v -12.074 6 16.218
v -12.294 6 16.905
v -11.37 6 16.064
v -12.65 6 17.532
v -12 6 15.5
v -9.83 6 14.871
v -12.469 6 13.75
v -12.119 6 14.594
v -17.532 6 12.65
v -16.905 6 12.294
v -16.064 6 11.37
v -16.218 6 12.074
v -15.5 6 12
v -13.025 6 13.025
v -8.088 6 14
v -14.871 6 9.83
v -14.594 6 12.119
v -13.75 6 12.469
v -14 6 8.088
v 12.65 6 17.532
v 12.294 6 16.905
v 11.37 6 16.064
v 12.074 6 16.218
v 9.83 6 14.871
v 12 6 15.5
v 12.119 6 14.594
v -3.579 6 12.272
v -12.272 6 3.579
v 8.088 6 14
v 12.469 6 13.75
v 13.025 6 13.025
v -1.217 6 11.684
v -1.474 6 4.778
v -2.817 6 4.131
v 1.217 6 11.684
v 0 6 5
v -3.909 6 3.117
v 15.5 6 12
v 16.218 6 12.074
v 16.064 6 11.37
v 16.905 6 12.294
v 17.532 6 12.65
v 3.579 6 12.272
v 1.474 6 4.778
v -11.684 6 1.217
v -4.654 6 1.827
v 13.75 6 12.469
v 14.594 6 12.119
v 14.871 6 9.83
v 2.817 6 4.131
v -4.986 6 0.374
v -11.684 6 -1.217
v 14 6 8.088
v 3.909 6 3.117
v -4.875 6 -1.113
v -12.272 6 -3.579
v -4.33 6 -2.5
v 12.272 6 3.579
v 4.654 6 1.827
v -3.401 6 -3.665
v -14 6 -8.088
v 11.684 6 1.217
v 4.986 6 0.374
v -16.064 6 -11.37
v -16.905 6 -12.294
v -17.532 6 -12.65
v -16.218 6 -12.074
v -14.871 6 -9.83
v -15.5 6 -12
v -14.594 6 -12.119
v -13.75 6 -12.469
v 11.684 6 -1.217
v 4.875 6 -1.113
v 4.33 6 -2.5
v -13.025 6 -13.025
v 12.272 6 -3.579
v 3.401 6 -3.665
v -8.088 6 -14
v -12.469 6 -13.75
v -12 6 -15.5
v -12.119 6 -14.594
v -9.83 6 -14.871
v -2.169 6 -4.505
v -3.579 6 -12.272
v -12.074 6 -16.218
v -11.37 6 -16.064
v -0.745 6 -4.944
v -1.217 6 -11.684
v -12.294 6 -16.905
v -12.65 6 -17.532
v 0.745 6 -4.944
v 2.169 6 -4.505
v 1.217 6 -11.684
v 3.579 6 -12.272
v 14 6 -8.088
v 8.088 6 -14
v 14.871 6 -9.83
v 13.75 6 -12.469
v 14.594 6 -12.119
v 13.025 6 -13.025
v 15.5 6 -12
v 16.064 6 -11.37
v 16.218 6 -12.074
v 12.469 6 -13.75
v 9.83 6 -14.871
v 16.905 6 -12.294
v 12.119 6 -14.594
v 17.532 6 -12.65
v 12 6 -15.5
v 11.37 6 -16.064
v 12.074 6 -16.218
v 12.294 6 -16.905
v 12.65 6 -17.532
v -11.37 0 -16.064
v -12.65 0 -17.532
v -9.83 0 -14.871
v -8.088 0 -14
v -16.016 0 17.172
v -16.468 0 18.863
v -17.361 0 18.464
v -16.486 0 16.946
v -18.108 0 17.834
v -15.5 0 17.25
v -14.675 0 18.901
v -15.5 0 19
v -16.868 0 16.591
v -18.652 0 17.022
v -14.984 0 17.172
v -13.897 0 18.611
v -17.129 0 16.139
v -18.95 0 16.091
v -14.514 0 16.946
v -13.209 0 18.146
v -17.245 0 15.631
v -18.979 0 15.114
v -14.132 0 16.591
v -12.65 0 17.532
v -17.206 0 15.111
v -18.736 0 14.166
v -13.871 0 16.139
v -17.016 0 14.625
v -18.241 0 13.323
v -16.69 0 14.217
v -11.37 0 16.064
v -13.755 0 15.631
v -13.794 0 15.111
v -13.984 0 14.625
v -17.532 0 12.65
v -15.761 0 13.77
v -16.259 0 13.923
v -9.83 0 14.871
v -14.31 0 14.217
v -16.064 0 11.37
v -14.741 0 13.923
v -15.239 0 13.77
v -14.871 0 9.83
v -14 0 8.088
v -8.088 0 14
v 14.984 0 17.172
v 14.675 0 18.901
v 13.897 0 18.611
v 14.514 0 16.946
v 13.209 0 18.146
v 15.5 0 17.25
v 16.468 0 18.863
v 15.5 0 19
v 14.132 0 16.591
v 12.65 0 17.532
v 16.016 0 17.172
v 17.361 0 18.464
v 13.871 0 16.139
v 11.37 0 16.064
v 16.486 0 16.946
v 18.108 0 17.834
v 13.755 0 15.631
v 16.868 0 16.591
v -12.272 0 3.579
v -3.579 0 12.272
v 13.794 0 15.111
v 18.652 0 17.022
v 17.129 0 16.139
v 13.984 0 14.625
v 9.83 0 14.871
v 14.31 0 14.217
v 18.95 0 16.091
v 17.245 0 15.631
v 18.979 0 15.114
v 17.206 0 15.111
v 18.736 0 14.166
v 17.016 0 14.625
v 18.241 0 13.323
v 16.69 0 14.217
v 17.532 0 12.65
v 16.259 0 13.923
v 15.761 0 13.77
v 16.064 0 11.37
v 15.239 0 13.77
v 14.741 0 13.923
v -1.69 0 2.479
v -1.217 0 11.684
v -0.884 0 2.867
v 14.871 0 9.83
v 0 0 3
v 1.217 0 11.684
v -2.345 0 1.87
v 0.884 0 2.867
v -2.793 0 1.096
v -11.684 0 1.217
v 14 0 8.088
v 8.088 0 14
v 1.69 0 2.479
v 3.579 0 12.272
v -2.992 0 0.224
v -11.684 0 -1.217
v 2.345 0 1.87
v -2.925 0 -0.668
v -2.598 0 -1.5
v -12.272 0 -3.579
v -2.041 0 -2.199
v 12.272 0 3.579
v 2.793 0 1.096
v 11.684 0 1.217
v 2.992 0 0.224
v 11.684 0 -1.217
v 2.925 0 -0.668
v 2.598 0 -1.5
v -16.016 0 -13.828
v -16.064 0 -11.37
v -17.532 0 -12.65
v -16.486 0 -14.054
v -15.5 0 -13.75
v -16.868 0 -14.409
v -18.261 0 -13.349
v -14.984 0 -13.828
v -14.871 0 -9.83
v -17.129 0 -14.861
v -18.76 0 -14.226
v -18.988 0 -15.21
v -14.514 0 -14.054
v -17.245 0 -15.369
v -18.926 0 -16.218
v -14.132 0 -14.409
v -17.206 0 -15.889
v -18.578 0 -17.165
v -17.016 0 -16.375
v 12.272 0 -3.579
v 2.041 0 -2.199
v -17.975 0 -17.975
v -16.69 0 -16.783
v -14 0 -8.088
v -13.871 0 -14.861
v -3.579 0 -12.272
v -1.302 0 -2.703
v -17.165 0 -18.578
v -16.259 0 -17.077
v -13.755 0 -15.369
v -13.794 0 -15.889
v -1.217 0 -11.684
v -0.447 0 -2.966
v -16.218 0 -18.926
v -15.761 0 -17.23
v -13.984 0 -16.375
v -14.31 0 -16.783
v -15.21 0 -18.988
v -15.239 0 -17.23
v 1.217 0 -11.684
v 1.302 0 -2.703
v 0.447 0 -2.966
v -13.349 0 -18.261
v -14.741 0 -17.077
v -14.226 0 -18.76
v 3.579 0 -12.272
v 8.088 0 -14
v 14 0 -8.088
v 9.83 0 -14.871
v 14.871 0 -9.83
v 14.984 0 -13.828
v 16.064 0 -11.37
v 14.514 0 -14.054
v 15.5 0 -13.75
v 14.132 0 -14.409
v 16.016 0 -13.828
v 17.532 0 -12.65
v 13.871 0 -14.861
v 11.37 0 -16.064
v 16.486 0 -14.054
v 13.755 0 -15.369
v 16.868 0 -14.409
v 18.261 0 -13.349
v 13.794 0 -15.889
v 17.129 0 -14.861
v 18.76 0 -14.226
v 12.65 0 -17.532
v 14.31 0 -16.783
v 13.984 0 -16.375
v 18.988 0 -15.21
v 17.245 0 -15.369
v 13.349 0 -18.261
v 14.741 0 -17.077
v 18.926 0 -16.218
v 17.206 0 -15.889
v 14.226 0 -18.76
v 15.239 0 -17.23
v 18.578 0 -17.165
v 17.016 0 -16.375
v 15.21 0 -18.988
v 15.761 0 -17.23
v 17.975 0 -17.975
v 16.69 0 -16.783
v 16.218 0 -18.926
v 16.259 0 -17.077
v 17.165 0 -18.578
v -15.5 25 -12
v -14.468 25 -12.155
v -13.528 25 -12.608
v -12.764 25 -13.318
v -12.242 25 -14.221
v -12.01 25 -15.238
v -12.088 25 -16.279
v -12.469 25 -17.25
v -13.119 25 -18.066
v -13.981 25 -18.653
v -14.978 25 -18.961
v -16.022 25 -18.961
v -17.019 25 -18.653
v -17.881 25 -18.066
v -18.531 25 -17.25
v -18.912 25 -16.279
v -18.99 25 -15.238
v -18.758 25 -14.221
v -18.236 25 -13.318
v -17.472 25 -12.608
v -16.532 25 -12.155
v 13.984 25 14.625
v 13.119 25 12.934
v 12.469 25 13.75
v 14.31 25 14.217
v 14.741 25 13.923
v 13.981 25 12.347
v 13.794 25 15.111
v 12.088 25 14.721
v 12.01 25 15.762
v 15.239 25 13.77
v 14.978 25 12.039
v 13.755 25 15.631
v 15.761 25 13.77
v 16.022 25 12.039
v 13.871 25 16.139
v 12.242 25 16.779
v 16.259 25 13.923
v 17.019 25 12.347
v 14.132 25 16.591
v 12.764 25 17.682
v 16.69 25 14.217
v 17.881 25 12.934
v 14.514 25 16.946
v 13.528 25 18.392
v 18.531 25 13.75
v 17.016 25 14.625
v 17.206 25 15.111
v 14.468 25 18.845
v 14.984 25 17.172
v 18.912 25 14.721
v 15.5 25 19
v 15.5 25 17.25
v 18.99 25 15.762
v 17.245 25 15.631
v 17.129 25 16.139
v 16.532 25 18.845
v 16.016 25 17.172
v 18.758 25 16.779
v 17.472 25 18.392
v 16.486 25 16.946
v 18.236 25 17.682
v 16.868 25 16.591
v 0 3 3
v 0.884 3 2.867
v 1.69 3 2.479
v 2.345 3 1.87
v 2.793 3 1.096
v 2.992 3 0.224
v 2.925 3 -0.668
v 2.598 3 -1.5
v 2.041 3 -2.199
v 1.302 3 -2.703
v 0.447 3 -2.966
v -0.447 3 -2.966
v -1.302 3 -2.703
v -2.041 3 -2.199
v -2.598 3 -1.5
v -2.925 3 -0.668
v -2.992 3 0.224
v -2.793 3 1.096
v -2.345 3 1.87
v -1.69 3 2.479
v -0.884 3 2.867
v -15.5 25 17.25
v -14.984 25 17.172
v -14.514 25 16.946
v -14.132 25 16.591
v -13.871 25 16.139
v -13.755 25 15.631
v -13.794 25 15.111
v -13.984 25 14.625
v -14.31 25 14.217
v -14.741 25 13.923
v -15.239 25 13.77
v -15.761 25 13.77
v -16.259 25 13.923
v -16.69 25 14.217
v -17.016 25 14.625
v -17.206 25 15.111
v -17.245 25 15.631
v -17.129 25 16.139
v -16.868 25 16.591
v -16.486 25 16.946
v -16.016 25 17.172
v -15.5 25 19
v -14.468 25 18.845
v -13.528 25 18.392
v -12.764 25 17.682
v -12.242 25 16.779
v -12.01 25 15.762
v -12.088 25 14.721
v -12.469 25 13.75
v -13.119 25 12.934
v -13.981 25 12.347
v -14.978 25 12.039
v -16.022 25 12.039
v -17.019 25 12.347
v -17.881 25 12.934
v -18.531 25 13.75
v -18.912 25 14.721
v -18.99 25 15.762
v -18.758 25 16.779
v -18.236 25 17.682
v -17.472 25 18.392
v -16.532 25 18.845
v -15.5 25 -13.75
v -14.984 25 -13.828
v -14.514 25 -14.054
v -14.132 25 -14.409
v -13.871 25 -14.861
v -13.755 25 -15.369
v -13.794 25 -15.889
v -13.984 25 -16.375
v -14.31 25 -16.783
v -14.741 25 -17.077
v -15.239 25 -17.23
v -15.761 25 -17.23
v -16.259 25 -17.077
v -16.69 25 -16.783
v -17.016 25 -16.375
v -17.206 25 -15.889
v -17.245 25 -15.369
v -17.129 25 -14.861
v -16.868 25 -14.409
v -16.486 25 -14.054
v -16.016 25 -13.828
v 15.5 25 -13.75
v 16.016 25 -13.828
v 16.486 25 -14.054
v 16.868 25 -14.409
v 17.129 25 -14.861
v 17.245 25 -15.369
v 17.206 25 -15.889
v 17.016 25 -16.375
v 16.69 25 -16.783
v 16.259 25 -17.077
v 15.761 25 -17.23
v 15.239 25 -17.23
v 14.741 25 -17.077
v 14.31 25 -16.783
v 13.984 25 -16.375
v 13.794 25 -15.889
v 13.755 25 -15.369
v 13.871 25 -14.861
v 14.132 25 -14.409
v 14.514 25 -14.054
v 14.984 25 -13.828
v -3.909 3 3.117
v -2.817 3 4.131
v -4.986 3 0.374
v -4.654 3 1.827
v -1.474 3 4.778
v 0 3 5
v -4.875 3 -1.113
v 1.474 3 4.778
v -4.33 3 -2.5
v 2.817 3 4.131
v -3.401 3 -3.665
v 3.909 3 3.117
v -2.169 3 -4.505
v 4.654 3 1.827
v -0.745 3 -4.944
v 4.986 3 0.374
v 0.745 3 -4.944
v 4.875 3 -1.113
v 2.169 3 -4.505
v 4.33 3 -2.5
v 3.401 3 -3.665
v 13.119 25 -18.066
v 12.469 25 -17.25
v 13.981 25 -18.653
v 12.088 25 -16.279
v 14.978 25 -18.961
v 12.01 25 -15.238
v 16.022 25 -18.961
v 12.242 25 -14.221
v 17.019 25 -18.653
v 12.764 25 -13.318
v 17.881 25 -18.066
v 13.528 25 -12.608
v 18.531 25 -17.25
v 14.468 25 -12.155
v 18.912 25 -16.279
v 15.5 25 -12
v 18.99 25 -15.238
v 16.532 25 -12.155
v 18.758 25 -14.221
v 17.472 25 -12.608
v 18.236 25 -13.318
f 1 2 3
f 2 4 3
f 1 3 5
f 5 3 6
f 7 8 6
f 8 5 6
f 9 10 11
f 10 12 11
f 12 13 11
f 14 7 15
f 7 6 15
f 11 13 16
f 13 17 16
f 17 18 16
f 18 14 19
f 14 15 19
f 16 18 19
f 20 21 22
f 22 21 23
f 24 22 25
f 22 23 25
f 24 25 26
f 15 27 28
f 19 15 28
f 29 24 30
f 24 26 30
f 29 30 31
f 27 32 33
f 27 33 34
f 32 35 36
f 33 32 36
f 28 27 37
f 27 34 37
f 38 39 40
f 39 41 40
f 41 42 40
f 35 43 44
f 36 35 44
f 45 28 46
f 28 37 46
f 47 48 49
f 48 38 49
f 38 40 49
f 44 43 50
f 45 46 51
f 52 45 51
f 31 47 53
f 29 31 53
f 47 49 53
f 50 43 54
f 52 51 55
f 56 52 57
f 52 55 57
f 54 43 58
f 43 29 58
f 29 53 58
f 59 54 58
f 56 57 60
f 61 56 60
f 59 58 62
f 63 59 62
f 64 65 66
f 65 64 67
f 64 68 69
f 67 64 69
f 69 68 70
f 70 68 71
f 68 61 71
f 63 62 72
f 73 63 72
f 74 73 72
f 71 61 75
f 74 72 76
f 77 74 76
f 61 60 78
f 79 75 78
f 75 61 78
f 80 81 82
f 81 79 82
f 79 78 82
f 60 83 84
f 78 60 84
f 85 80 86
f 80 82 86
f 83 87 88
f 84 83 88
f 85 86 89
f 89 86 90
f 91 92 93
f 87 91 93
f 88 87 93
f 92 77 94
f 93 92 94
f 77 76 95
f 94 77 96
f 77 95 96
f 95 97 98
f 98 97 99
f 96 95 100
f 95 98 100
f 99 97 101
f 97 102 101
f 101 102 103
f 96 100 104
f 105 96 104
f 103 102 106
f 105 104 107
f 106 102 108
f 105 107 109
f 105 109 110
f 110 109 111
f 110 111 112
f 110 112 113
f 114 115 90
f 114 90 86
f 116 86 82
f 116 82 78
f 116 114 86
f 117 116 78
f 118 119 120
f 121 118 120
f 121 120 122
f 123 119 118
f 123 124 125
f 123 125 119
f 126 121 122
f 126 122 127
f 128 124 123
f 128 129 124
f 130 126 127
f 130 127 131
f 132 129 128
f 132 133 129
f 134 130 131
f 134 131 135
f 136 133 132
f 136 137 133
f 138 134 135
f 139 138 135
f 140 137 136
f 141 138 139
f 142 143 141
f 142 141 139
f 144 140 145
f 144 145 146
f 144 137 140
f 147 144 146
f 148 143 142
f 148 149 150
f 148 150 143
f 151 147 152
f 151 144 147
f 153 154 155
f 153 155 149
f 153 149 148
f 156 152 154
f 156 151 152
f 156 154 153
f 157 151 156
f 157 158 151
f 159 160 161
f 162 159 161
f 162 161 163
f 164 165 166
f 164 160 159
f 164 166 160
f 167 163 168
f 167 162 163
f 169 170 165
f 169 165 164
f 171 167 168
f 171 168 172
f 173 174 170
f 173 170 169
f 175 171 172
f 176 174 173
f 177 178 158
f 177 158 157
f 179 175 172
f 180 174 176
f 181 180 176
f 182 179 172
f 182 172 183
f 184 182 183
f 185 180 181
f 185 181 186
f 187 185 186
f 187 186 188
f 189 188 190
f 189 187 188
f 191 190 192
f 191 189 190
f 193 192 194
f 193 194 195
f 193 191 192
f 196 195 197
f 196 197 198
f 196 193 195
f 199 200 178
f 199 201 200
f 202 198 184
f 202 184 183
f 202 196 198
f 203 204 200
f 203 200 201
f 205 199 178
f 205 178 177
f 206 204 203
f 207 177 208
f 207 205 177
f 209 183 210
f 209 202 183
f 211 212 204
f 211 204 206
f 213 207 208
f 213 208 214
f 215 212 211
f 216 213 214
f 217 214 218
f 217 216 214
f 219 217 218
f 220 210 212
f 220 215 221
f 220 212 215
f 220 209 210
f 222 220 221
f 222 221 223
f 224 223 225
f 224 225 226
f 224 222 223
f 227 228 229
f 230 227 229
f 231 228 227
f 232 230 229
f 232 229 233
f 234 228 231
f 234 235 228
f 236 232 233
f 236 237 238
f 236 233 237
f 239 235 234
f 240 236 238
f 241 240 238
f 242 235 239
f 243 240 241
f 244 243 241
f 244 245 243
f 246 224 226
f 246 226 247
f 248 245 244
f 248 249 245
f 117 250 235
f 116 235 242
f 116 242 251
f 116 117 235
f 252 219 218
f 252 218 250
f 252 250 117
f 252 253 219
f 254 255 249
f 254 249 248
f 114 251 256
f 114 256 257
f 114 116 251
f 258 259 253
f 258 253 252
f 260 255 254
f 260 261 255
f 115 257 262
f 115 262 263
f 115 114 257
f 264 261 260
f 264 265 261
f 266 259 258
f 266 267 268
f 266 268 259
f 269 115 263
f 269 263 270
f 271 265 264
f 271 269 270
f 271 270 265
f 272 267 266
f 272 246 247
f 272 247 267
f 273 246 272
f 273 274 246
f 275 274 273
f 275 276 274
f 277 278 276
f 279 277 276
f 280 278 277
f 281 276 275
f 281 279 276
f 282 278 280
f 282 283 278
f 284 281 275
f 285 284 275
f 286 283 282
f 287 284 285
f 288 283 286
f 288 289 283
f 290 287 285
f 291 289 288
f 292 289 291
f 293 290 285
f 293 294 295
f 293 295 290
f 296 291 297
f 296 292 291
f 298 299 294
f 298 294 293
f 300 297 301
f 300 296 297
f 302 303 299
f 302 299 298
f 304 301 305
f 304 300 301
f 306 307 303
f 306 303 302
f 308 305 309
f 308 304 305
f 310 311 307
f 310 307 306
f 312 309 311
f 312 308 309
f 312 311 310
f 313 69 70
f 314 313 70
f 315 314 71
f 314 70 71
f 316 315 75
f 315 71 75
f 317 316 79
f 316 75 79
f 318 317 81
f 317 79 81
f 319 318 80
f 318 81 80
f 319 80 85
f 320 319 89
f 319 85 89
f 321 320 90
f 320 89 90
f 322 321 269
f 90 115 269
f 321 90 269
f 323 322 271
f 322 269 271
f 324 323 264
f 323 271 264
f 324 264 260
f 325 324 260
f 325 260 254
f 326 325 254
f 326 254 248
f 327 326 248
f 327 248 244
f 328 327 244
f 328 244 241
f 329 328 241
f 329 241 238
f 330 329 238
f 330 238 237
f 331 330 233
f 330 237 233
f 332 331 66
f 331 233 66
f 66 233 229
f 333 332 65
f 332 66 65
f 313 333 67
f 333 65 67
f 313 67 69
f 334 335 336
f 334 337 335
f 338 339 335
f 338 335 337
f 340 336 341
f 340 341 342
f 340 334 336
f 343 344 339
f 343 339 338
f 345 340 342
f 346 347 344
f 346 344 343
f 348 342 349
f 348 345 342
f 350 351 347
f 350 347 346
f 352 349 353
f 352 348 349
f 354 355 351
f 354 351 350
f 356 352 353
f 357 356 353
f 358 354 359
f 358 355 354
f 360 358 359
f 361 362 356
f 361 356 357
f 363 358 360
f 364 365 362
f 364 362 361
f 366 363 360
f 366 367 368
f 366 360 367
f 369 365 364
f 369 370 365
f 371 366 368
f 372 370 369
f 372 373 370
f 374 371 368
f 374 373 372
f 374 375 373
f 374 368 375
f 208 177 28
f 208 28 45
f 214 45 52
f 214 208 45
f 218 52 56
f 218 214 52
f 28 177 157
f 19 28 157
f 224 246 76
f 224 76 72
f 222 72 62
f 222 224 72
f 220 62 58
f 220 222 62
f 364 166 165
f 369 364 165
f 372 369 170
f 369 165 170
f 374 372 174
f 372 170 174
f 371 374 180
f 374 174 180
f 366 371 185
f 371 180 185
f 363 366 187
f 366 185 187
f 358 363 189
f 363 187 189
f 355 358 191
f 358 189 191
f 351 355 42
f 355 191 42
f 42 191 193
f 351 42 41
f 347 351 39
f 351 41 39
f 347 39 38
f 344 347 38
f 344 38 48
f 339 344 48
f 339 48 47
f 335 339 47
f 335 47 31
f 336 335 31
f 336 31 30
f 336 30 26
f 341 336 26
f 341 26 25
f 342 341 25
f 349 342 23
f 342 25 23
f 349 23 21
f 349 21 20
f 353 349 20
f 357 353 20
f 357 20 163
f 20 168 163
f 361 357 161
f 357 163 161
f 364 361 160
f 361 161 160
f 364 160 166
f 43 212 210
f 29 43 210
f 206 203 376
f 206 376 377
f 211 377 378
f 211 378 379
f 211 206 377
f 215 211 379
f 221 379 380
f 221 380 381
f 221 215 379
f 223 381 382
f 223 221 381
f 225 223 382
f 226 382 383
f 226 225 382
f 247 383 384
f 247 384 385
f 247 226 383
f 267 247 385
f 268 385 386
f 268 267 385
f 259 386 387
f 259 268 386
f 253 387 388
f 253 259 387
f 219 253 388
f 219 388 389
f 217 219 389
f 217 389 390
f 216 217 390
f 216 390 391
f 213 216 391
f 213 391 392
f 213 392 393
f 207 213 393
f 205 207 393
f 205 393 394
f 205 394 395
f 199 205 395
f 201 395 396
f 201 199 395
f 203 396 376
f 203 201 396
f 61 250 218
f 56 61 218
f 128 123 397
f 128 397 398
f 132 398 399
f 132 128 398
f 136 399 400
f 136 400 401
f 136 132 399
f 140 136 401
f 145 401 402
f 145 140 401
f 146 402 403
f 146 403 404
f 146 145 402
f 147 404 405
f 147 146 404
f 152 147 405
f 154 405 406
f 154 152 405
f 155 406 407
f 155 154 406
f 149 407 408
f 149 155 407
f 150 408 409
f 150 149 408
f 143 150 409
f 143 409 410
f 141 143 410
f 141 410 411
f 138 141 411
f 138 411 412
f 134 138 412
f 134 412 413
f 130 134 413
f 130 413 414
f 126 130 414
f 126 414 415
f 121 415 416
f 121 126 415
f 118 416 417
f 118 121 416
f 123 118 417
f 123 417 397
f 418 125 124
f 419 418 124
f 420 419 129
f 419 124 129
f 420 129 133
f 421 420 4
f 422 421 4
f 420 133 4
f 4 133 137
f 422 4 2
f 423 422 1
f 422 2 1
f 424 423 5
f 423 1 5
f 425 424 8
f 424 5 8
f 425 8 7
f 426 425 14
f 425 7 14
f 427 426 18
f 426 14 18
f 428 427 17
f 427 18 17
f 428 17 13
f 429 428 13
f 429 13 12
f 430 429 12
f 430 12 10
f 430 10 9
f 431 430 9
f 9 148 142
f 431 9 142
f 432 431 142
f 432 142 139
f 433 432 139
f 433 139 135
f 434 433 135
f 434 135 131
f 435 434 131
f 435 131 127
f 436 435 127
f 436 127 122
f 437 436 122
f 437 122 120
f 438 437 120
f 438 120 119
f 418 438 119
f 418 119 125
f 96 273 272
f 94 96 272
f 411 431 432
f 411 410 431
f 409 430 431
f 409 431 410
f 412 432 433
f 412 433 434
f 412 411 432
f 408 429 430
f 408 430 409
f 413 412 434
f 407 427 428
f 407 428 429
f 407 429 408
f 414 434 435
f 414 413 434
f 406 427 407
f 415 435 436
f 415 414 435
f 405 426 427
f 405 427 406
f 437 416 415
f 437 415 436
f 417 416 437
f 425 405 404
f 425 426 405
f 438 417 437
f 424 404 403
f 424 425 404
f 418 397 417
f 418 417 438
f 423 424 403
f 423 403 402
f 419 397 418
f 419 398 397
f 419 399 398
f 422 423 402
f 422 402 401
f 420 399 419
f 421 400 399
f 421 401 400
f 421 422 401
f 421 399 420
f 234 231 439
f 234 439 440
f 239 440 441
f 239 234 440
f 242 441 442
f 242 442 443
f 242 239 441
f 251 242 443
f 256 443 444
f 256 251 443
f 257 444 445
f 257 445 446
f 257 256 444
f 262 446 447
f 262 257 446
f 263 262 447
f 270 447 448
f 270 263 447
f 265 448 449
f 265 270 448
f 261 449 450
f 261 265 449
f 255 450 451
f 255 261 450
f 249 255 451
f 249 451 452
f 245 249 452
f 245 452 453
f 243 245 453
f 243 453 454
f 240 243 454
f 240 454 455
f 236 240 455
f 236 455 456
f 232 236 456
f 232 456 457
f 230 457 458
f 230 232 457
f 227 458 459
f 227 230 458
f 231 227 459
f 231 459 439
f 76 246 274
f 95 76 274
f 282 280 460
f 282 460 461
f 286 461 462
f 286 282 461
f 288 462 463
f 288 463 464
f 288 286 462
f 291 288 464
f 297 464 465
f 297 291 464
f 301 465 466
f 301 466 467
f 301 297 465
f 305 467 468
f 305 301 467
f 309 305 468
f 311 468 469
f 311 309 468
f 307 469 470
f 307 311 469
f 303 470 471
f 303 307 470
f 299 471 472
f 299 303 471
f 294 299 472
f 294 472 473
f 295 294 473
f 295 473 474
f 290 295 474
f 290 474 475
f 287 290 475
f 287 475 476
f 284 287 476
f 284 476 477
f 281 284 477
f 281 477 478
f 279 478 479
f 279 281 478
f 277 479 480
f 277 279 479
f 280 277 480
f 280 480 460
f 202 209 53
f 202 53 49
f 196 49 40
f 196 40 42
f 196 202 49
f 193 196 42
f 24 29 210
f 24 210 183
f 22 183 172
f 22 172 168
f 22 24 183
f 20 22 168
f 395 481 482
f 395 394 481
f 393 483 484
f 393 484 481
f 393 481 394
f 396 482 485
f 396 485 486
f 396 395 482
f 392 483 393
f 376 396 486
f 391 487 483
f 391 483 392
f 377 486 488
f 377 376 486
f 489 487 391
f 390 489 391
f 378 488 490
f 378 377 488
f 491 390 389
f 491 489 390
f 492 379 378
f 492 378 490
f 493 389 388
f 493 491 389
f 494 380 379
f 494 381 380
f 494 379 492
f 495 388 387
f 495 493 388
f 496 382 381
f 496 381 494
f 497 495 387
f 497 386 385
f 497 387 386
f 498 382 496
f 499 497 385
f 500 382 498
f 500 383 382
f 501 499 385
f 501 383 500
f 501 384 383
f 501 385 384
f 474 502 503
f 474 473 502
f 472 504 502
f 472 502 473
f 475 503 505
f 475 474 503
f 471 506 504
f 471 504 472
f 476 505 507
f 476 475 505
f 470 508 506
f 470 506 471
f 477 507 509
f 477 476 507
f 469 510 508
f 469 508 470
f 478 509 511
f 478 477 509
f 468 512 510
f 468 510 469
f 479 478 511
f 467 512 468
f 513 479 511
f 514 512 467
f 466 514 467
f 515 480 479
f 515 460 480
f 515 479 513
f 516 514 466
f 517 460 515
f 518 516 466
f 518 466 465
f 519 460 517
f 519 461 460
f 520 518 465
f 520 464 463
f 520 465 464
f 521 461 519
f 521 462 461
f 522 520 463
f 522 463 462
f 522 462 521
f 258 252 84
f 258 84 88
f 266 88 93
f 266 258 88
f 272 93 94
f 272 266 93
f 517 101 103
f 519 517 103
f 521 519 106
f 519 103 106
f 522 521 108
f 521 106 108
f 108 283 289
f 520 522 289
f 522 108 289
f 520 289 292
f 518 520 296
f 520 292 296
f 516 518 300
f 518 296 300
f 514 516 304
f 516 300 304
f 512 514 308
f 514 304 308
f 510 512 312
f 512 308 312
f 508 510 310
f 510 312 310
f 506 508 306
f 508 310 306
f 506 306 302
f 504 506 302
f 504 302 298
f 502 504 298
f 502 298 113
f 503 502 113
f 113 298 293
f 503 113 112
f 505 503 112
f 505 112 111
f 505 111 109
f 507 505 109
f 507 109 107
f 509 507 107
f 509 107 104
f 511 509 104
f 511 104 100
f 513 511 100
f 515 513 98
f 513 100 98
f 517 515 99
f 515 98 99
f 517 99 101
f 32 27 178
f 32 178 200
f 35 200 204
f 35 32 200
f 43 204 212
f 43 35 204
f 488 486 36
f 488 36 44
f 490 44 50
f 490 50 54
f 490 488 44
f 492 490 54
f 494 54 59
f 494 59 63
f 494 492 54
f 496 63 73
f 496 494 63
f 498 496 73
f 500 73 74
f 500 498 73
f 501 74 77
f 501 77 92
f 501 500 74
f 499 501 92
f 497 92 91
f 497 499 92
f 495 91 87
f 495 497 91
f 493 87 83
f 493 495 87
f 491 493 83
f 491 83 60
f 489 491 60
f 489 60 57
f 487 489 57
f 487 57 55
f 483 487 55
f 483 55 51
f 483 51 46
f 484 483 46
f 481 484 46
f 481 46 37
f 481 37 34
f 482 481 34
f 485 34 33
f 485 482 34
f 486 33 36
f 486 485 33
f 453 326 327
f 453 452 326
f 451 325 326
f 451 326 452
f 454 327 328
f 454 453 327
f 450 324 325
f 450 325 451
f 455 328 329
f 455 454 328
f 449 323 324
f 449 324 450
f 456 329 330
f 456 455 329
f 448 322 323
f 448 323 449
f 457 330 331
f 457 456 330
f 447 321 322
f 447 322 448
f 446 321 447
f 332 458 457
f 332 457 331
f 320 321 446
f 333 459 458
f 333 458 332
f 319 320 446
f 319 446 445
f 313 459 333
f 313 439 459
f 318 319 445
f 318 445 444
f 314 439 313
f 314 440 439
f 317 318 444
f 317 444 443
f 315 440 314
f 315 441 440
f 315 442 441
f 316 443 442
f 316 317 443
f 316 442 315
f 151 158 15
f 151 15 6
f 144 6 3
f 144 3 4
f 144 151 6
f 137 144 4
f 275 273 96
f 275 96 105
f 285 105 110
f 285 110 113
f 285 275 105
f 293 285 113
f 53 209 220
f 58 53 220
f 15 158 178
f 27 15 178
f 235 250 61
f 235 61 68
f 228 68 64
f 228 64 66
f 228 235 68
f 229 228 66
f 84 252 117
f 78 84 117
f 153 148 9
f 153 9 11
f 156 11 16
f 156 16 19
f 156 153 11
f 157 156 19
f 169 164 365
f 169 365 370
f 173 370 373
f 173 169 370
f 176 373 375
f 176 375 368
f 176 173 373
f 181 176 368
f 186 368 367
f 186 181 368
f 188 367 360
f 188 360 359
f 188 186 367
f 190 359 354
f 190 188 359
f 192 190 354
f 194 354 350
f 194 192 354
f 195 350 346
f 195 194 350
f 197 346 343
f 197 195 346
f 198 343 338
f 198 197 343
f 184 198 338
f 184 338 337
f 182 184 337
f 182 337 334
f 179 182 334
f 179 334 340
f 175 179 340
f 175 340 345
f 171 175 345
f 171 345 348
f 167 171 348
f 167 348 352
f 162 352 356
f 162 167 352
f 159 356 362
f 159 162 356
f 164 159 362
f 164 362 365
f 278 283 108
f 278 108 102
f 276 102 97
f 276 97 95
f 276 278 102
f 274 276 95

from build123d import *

# Parameters (mm, degrees)
SCHIZZO1_R                     = 3.5
SCHIZZO1_R_2                   = 1.75
ESTRUSIONE_ESTRUSIONE1_DEPTH   = 25
ESTRUSIONE_ESTRUSIONE1_2_DEPTH = 25
ESTRUSIONE_ESTRUSIONE1_3_DEPTH = 25
ESTRUSIONE_ESTRUSIONE1_4_DEPTH = 25
SCHIZZO1_3_R                   = 10.9
SCHIZZO1_3_R_2                 = 5
SCHIZZO1_3_R_3                 = 3
ESTRUSIONE_ESTRUSIONE2_DEPTH   = 3
ESTRUSIONE_ESTRUSIONE4_START   = 3
SCHIZZO1_5_R                   = 10.9
SCHIZZO1_5_R_2                 = 5
ESTRUSIONE_ESTRUSIONE4_DEPTH   = 3
RACCORDO1_R                    = 10


with BuildPart() as part:
    # Schizzo1 → Estrusione-Estrusione1 (new body)
    with BuildSketch(Plane(origin=(0, 0, 0), x_dir=(1, 0, 0), z_dir=(0, 1, 0))):
        with Locations(Location((-15.5, -15.5, 0), (0, 0, 270))):
            Circle(SCHIZZO1_R)
        with Locations(Location((-15.5, -15.5, 0), (0, 0, 270))):
            Circle(SCHIZZO1_R_2, mode=Mode.SUBTRACT)
    extrude(amount=ESTRUSIONE_ESTRUSIONE1_DEPTH)



with BuildPart() as body_2:
    # Schizzo1 → Estrusione-Estrusione1 2 (new body)
    with BuildSketch(Plane(origin=(0, 0, 0), x_dir=(1, 0, 0), z_dir=(0, 1, 0))):
        with Locations(Location((-15.5, 15.5, 0), (0, 0, 270))):
            Circle(SCHIZZO1_R)
        with Locations(Location((-15.5, 15.5, 0), (0, 0, 270))):
            Circle(SCHIZZO1_R_2, mode=Mode.SUBTRACT)
    extrude(amount=ESTRUSIONE_ESTRUSIONE1_2_DEPTH)


with BuildPart() as body_3:
    # Schizzo1 → Estrusione-Estrusione1 3 (new body)
    with BuildSketch(Plane(origin=(0, 0, 0), x_dir=(1, 0, 0), z_dir=(0, 1, 0))):
        with Locations(Location((15.5, 15.5, 0), (0, 0, 270))):
            Circle(SCHIZZO1_R)
        with Locations(Location((15.5, 15.5, 0), (0, 0, 270))):
            Circle(SCHIZZO1_R_2, mode=Mode.SUBTRACT)
    extrude(amount=ESTRUSIONE_ESTRUSIONE1_3_DEPTH)


with BuildPart() as body_4:
    # Schizzo1 → Estrusione-Estrusione1 4 (new body)
    with BuildSketch(Plane(origin=(0, 0, 0), x_dir=(1, 0, 0), z_dir=(0, 1, 0))):
        with Locations(Location((15.5, -15.5, 0), (0, 0, 270))):
            Circle(SCHIZZO1_R)
        with Locations(Location((15.5, -15.5, 0), (0, 0, 270))):
            Circle(SCHIZZO1_R_2, mode=Mode.SUBTRACT)
    extrude(amount=ESTRUSIONE_ESTRUSIONE1_4_DEPTH)


with BuildPart() as part_1:
    add(part.part)

    add(body_2.part)  # Estrusione-Estrusione2 merges body 2

    add(body_3.part)  # Estrusione-Estrusione2 merges body 3

    add(body_4.part)  # Estrusione-Estrusione2 merges body 4
    # Schizzo1<3> → Estrusione-Estrusione2 (add)
    # profile 1 of 6: a face of its own
    with BuildSketch(Plane(origin=(0, 0, 0), x_dir=(1, 0, 0), z_dir=(0, 1, 0))):
        with BuildLine():
            Line((-10.9, 0), (-15.5, -12))
            ThreePointArc((-15.5, -12), (-13.025126266, -13.025126266), (-12, -15.5))
            Line((-12, -15.5), (0, -10.9))
            ThreePointArc((0, -10.9), (-7.707463915, -7.707463915), (-10.9, 0))
        make_face()
    # profile 2 of 6: a face of its own
    with BuildSketch(Plane(origin=(0, 0, 0), x_dir=(1, 0, 0), z_dir=(0, 1, 0))):
        with BuildLine():
            ThreePointArc((10.9, 0), (7.707463915, -7.707463915), (0, -10.9))
            Line((0, -10.9), (12, -15.5))
            ThreePointArc((12, -15.5), (13.025126266, -13.025126266), (15.5, -12))
            Line((15.5, -12), (10.9, 0))
        make_face()
    # profile 3 of 6: a face of its own
    with BuildSketch(Plane(origin=(0, 0, 0), x_dir=(1, 0, 0), z_dir=(0, 1, 0))):
        with BuildLine():
            Line((12, 15.5), (0, 10.9))
            ThreePointArc((0, 10.9), (7.707463915, 7.707463915), (10.9, 0))
            Line((10.9, 0), (15.5, 12))
            ThreePointArc((15.5, 12), (13.025126266, 13.025126266), (12, 15.5))
        make_face()
    # profile 4 of 6: a face of its own
    with BuildSketch(Plane(origin=(0, 0, 0), x_dir=(1, 0, 0), z_dir=(0, 1, 0))):
        with BuildLine():
            Line((-15.5, 12), (-10.9, 0))
            ThreePointArc((-10.9, 0), (-7.707463915, 7.707463915), (0, 10.9))
            Line((0, 10.9), (-12, 15.5))
            ThreePointArc((-12, 15.5), (-13.025126266, 13.025126266), (-15.5, 12))
        make_face()
    # profile 5 of 6: a face of its own
    with BuildSketch(Plane(origin=(0, 0, 0), x_dir=(1, 0, 0), z_dir=(0, 1, 0))):
        Circle(SCHIZZO1_3_R)
        Circle(SCHIZZO1_3_R_2, mode=Mode.SUBTRACT)
    # profile 6 of 6: a face of its own
    with BuildSketch(Plane(origin=(0, 0, 0), x_dir=(1, 0, 0), z_dir=(0, 1, 0))):
        Circle(SCHIZZO1_3_R_2)
        with Locations(Location((0, 0, 0), (0, 0, 270))):
            Circle(SCHIZZO1_3_R_3, mode=Mode.SUBTRACT)
    extrude(amount=ESTRUSIONE_ESTRUSIONE2_DEPTH)

    # Schizzo1<5> → Estrusione-Estrusione4 (add)
    # profile 1 of 5: a face of its own
    with BuildSketch(Plane(origin=(0, 0, 0), x_dir=(1, 0, 0), z_dir=(0, 1, 0)).offset(ESTRUSIONE_ESTRUSIONE4_START)):
        Circle(SCHIZZO1_5_R)
        with Locations(Location((0, 0, 0), (0, 0, 270))):
            Circle(SCHIZZO1_5_R_2, mode=Mode.SUBTRACT)
    # profile 2 of 5: a face of its own
    with BuildSketch(Plane(origin=(0, 0, 0), x_dir=(1, 0, 0), z_dir=(0, 1, 0)).offset(ESTRUSIONE_ESTRUSIONE4_START)):
        with BuildLine():
            Line((-10.9, 0), (-15.5, -12))
            ThreePointArc((-15.5, -12), (-13.025126266, -13.025126266), (-12, -15.5))
            Line((-12, -15.5), (0, -10.9))
            ThreePointArc((0, -10.9), (-7.707463915, -7.707463915), (-10.9, 0))
        make_face()
    # profile 3 of 5: a face of its own
    with BuildSketch(Plane(origin=(0, 0, 0), x_dir=(1, 0, 0), z_dir=(0, 1, 0)).offset(ESTRUSIONE_ESTRUSIONE4_START)):
        with BuildLine():
            Line((-15.5, 12), (-10.9, 0))
            ThreePointArc((-10.9, 0), (-7.707463915, 7.707463915), (0, 10.9))
            Line((0, 10.9), (-12, 15.5))
            ThreePointArc((-12, 15.5), (-13.025126266, 13.025126266), (-15.5, 12))
        make_face()
    # profile 4 of 5: a face of its own
    with BuildSketch(Plane(origin=(0, 0, 0), x_dir=(1, 0, 0), z_dir=(0, 1, 0)).offset(ESTRUSIONE_ESTRUSIONE4_START)):
        with BuildLine():
            Line((12, 15.5), (0, 10.9))
            ThreePointArc((0, 10.9), (7.707463915, 7.707463915), (10.9, 0))
            Line((10.9, 0), (15.5, 12))
            ThreePointArc((15.5, 12), (13.025126266, 13.025126266), (12, 15.5))
        make_face()
    # profile 5 of 5: a face of its own
    with BuildSketch(Plane(origin=(0, 0, 0), x_dir=(1, 0, 0), z_dir=(0, 1, 0)).offset(ESTRUSIONE_ESTRUSIONE4_START)):
        with BuildLine():
            ThreePointArc((10.9, 0), (7.707463915, -7.707463915), (0, -10.9))
            Line((0, -10.9), (12, -15.5))
            ThreePointArc((12, -15.5), (13.025126266, -13.025126266), (15.5, -12))
            Line((15.5, -12), (10.9, 0))
        make_face()
    extrude(amount=ESTRUSIONE_ESTRUSIONE4_DEPTH)

    # Raccordo1
    # the kernel refuses this fillet: 10 mm, written as the material it adds along each edge
    with BuildSketch(Plane(origin=(-15.5, 0, 12), x_dir=(0.3579360116324522, 0, -0.9337461173020496), z_dir=(0, 1, 0)), Plane(origin=(15.5, 0, -12), x_dir=(-0.35793601163245214, 0, 0.9337461173020496), z_dir=(0, 1, 0)), Plane(origin=(-12, 0, -15.5), x_dir=(0.9337461173020497, 0, 0.35793601163245176), z_dir=(0, 1, 0))) as raccordo1_piece_1:
        with BuildLine():
            CenterArc((4.190107638, 10), RACCORDO1_R, 236.464010446, 33.535989554)
            ThreePointArc((-1.334499065, 1.66461034), (-0.537321341, 0.936467115), (0, 0))
            Line((0, 0), (4.190107638, 0))
        make_face()
    extrude(amount=6)
    with BuildSketch(Plane(origin=(-12, 0, 15.5), x_dir=(-0.3047854828813613, 0, 0.952421025295418), z_dir=(0, 1, 0)), Plane(origin=(12, 6, 15.5), x_dir=(0.30478548288135804, 0, 0.9524210252954193), z_dir=(0, -1, 0)), Plane(origin=(15.5, 0, 12), x_dir=(0.9524210252954187, 0, 0.3047854828813593), z_dir=(0, 1, 0)), Plane(origin=(12, 0, -15.5), x_dir=(0.30478548288136037, 0, -0.9524210252954185), z_dir=(0, 1, 0)), Plane(origin=(-15.5, 0, -12), x_dir=(-0.952421025295419, 0, -0.304785482881358), z_dir=(0, 1, 0))) as raccordo1_piece_2:
        with BuildLine():
            CenterArc((5.181353209, 9.524210253), RACCORDO1_R, 218.718751934, 33.535989554)
            Line((-2.620904134, 3.269229809), (0, 0))
            ThreePointArc((0, 0), (1.06674919, 0.166526411), (2.13349838, 0))
        make_face()
    extrude(amount=6)
    with BuildSketch(Plane(origin=(0, 6, 10.9), x_dir=(-0.9337461173020492, 0, 0.3579360116324534), z_dir=(0, -1, 0))) as raccordo1_piece_3:
        with BuildLine():
            CenterArc((RACCORDO1_R * 0.383333333333, -RACCORDO1_R), RACCORDO1_R, 90, 41.946986843)
            Line((-RACCORDO1_R * 0.285109388875, -RACCORDO1_R * 0.256236376847), (0, 0))
            Line((0, 0), (RACCORDO1_R * 0.383333333333, 0))
        make_face()
    extrude(amount=6)
    with BuildSketch(Plane(origin=(10.9, 0, 0), x_dir=(0.35793601163245314, 0, 0.9337461173020493), z_dir=(0, 1, 0)), Plane(origin=(0, 0, -10.9), x_dir=(0.9337461173020492, 0, -0.3579360116324533), z_dir=(0, 1, 0)), Plane(origin=(-10.9, 0, 0), x_dir=(-0.3579360116324529, 0, -0.9337461173020494), z_dir=(0, 1, 0))) as raccordo1_piece_4:
        with BuildLine():
            CenterArc((RACCORDO1_R * 0.383333333333, RACCORDO1_R), RACCORDO1_R, 228.053013157, 41.946986843)
            Line((-RACCORDO1_R * 0.285109388875, RACCORDO1_R * 0.256236376847), (0, 0))
            Line((0, 0), (RACCORDO1_R * 0.383333333333, 0))
        make_face()
    extrude(amount=6)


solid = part_1.part
